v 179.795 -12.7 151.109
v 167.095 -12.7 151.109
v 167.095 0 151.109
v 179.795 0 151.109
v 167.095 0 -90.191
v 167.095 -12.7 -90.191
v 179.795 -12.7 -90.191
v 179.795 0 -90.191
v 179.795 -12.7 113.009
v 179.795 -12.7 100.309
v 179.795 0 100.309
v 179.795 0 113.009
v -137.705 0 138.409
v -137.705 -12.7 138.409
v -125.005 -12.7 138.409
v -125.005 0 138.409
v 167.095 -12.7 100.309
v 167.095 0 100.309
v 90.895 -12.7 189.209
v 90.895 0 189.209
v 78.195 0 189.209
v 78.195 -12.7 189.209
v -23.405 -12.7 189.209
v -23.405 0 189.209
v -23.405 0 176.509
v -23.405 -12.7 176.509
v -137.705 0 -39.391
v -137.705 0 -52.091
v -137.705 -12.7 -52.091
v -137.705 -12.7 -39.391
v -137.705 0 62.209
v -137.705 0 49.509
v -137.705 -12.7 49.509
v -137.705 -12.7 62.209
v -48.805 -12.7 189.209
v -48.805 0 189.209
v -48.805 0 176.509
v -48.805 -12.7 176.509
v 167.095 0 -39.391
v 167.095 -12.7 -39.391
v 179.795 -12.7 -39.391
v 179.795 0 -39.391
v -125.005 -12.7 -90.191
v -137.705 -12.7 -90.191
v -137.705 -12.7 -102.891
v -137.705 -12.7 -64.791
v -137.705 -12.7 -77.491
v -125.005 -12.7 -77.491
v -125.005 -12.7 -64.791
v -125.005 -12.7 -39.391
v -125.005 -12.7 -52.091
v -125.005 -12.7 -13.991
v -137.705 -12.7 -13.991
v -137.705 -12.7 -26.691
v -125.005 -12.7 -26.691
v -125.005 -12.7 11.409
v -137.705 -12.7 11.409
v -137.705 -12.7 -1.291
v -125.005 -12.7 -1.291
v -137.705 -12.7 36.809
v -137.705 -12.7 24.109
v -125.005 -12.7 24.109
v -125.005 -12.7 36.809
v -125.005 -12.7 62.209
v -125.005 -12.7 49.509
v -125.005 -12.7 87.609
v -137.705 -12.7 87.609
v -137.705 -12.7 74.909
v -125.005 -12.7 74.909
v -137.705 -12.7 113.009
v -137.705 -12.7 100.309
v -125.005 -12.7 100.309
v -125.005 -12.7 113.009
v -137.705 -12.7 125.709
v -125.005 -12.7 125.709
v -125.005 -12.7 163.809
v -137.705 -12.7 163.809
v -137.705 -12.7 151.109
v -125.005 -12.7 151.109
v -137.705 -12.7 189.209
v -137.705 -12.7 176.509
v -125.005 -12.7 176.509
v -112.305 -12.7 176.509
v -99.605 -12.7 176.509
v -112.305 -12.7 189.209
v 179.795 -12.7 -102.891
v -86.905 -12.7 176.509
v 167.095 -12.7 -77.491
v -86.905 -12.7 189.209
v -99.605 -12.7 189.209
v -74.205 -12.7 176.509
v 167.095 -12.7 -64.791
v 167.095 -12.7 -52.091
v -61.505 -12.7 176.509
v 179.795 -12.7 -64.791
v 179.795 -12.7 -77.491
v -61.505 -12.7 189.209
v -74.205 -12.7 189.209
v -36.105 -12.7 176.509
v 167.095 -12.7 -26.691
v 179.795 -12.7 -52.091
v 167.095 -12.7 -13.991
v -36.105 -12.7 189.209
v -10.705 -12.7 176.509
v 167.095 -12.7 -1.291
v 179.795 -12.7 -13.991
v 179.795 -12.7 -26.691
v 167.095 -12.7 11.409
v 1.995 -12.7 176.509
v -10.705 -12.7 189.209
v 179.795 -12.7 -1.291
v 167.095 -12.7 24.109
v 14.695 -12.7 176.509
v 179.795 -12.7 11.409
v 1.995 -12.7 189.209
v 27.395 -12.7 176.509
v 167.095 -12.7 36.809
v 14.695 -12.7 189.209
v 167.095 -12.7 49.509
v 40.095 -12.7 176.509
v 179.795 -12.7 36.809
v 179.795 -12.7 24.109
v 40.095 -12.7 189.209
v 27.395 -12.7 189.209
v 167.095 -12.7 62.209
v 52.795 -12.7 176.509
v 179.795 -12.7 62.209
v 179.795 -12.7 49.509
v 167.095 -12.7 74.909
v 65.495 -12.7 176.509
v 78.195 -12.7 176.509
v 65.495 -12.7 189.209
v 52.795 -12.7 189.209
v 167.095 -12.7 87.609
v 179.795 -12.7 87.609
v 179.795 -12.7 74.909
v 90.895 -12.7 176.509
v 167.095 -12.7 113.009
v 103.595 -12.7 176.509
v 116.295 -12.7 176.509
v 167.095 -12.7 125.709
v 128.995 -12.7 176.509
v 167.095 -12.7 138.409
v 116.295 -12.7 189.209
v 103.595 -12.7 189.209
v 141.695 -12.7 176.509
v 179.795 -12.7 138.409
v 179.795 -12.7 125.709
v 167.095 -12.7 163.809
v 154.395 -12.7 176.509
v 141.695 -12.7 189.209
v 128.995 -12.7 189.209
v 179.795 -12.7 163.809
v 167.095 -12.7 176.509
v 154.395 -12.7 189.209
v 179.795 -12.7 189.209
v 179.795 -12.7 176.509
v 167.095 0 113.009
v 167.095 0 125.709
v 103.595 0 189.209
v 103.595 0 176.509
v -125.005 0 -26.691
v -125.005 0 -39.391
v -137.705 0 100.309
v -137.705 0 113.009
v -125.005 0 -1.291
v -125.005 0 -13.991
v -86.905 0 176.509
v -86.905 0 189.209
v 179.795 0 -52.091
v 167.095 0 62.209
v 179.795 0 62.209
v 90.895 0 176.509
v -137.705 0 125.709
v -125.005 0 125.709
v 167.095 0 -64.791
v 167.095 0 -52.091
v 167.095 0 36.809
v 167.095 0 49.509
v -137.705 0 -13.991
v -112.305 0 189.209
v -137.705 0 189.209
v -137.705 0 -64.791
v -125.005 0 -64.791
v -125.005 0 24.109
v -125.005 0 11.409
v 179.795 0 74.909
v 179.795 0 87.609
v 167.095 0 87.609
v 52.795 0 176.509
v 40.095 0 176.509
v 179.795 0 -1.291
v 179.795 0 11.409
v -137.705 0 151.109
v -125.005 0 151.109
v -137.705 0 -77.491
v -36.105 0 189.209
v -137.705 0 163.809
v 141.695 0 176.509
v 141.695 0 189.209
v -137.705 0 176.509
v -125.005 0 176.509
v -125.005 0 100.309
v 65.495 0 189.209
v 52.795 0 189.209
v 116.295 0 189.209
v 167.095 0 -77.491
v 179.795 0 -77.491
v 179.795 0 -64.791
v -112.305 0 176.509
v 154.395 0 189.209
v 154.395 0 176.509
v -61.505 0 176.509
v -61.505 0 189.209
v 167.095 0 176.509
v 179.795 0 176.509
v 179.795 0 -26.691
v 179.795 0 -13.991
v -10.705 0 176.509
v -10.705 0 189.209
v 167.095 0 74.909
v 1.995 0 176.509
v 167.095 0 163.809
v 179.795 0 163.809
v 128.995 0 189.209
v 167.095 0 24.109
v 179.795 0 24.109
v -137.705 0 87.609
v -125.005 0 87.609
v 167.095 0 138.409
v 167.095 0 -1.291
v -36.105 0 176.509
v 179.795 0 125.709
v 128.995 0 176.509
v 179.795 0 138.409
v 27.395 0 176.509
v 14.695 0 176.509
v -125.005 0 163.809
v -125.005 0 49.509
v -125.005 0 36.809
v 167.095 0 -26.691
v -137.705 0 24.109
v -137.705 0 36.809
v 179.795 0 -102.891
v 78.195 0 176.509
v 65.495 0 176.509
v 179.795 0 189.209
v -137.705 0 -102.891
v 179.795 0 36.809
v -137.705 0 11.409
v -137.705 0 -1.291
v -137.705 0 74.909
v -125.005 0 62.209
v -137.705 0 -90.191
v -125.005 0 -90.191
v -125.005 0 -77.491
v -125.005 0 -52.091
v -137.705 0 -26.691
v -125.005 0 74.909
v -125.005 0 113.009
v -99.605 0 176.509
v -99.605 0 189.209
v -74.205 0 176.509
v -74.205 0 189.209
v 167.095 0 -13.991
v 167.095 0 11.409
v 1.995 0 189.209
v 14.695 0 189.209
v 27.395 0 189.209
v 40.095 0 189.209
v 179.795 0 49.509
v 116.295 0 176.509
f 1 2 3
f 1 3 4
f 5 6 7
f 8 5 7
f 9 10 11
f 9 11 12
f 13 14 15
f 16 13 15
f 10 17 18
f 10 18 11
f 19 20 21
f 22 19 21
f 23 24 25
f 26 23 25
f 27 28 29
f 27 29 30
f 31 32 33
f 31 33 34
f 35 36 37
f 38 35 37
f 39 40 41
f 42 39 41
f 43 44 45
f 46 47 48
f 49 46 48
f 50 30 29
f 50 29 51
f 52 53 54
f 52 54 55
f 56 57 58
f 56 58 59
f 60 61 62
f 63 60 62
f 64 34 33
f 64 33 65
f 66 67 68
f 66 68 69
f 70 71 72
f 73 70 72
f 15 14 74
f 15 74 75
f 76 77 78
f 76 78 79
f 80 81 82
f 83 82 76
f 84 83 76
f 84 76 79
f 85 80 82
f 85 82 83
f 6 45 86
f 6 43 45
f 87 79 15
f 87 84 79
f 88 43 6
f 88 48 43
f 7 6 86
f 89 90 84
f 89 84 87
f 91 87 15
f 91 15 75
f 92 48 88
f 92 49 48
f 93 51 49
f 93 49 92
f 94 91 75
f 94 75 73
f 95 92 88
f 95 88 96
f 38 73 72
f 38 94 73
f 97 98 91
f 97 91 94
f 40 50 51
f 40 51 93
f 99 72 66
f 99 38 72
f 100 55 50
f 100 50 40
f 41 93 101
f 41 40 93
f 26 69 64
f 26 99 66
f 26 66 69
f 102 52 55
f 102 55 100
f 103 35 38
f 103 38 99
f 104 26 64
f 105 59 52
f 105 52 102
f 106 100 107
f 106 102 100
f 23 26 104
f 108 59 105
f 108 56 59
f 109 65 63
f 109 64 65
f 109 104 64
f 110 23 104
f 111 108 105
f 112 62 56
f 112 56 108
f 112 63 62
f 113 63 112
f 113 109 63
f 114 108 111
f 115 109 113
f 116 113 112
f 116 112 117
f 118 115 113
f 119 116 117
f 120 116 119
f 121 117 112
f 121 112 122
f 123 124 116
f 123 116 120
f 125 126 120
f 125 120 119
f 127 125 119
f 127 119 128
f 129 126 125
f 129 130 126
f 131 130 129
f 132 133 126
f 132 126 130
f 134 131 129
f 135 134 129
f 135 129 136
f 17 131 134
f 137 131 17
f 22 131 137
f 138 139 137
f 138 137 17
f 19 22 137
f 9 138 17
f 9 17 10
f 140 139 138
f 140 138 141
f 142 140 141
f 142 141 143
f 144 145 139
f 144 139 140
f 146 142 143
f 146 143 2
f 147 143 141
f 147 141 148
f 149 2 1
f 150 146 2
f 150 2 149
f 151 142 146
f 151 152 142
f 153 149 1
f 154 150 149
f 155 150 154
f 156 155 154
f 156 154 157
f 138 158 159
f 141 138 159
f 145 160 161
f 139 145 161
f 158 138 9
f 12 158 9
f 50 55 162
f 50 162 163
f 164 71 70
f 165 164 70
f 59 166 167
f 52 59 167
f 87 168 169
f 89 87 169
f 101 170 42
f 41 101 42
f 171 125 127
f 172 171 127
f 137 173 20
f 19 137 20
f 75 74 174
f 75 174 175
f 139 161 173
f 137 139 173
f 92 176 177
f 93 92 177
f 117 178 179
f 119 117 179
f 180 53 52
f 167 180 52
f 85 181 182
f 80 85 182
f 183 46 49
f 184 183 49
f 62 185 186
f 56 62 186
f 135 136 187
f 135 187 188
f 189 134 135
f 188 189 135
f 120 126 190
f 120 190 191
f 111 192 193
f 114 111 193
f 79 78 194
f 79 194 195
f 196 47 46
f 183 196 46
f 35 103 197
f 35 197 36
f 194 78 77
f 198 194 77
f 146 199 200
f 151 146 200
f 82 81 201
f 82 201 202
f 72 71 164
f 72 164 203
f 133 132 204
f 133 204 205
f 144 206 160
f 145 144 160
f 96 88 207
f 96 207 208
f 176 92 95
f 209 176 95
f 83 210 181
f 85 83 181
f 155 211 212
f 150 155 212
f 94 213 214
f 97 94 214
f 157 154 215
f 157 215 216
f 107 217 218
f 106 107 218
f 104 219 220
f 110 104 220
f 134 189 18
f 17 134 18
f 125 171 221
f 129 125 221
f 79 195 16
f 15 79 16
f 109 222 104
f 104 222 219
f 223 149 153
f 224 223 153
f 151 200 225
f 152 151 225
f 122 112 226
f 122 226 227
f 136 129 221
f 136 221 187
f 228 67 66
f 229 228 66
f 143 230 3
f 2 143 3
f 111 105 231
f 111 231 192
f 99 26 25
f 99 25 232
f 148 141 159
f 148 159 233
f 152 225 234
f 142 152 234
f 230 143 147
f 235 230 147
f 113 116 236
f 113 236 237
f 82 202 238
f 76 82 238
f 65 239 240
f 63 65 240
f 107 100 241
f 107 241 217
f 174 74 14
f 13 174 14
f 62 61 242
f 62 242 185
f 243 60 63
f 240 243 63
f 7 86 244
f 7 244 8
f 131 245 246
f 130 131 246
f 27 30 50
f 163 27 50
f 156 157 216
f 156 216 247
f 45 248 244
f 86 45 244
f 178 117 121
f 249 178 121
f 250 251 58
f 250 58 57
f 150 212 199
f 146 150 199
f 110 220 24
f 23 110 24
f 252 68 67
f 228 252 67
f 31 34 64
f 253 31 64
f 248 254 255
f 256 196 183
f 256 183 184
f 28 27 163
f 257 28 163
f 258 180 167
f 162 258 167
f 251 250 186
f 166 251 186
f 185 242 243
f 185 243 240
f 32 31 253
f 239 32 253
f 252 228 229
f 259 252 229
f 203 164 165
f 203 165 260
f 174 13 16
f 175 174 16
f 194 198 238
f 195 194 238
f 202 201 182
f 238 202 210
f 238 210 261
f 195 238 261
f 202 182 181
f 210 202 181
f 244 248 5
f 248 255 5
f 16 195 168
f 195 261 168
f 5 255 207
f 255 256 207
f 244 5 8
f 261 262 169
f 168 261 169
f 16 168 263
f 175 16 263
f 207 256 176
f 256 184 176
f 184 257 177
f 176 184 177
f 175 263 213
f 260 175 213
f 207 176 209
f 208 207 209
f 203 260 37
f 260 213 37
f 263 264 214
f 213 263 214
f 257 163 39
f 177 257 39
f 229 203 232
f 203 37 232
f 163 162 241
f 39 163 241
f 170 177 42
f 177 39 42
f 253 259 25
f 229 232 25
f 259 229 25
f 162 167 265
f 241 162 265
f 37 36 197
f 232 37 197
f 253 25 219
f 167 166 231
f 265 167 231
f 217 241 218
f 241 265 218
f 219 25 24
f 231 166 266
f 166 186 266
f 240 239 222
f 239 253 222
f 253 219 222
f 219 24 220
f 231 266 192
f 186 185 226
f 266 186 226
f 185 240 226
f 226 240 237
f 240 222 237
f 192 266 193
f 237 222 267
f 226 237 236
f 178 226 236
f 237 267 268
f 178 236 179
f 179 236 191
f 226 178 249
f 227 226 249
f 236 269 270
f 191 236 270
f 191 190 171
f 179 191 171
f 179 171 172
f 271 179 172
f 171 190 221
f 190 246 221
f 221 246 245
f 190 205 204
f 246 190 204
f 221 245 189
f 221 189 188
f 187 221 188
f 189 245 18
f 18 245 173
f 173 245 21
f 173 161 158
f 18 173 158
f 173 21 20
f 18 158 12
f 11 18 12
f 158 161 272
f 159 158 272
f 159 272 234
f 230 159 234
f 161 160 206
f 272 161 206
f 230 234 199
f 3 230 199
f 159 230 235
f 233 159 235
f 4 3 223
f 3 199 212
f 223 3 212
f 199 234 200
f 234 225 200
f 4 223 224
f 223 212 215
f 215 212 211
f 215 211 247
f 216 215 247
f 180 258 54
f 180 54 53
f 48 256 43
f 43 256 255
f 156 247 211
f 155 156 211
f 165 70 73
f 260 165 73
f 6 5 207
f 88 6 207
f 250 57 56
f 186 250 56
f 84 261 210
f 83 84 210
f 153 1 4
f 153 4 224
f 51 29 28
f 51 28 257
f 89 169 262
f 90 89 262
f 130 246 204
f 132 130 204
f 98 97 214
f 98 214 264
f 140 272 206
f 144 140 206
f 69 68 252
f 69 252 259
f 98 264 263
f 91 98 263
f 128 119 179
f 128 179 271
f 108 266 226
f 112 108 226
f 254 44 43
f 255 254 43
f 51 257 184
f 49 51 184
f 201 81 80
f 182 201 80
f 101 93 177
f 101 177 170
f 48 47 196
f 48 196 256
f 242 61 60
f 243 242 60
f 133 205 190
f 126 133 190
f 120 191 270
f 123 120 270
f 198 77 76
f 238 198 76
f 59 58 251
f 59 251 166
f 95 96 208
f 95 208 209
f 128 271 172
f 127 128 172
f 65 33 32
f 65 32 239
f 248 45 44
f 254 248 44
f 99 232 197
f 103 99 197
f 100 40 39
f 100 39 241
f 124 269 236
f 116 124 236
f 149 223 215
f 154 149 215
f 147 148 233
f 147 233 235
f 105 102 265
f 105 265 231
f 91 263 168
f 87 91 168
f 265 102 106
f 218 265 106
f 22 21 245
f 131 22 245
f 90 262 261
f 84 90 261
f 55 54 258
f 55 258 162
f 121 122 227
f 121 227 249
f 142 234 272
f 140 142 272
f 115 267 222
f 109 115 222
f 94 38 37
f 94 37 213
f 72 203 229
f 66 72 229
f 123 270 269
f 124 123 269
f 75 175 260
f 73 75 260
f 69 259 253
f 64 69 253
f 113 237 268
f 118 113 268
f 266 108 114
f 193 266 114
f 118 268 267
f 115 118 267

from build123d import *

# Parameters (mm, degrees)
F0_W     = 12.7
F0_H     = 12.7
F1_DEPTH = 12.7


with BuildPart() as f1:
    # F0 (on Front) → F1 (new body)
    with BuildSketch(Plane.XZ):
        with Locations((-131.354641, 182.858769)):
            Rectangle(F0_W, F0_H)
        with Locations((-131.354641, 157.458769)):
            Rectangle(F0_W, F0_H)
        Polygon((-112.304641, 189.208769), (-125.004641, 189.208769), (-125.004641, 176.508769), (-125.004641, 163.808769), (-125.004641, 151.108769), (-125.004641, 138.408769), (-125.004641, 125.708769), (-125.004641, 113.008769), (-125.004641, 100.308769), (-125.004641, 87.608769), (-125.004641, 74.908769), (-125.004641, 62.208769), (-125.004641, 49.508769), (-125.004641, 36.808769), (-125.004641, 24.108769), (-125.004641, 11.408769), (-125.004641, -1.291231), (-125.004641, -13.991231), (-125.004641, -26.691231), (-125.004641, -39.391231), (-125.004641, -52.091231), (-125.004641, -64.791231), (-125.004641, -77.491231), (-125.004641, -90.191231), (-125.004641, -102.891231), (167.095359, -102.891231), (167.095359, -90.191231), (167.095359, -77.491231), (167.095359, -64.791231), (167.095359, -52.091231), (167.095359, -39.391231), (167.095359, -26.691231), (167.095359, -13.991231), (167.095359, -1.291231), (167.095359, 11.408769), (167.095359, 24.108769), (167.095359, 36.808769), (167.095359, 49.508769), (167.095359, 62.208769), (167.095359, 74.908769), (167.095359, 87.608769), (167.095359, 100.308769), (167.095359, 113.008769), (167.095359, 125.708769), (167.095359, 138.408769), (167.095359, 151.108769), (167.095359, 163.808769), (167.095359, 176.508769), (167.095359, 189.208769), (154.395359, 189.208769), (154.395359, 176.508769), (141.695359, 176.508769), (141.695359, 189.208769), (128.995359, 189.208769), (128.995359, 176.508769), (116.295359, 176.508769), (116.295359, 189.208769), (103.595359, 189.208769), (103.595359, 176.508769), (90.895359, 176.508769), (90.895359, 189.208769), (78.195359, 189.208769), (78.195359, 176.508769), (65.495359, 176.508769), (65.495359, 189.208769), (52.795359, 189.208769), (52.795359, 176.508769), (40.095359, 176.508769), (40.095359, 189.208769), (27.395359, 189.208769), (27.395359, 176.508769), (14.695359, 176.508769), (14.695359, 189.208769), (1.995359, 189.208769), (1.995359, 176.508769), (-10.704641, 176.508769), (-10.704641, 189.208769), (-23.404641, 189.208769), (-23.404641, 176.508769), (-36.104641, 176.508769), (-36.104641, 189.208769), (-48.804641, 189.208769), (-48.804641, 176.508769), (-61.504641, 176.508769), (-61.504641, 189.208769), (-74.204641, 189.208769), (-74.204641, 176.508769), (-86.904641, 176.508769), (-86.904641, 189.208769), (-99.604641, 189.208769), (-99.604641, 176.508769), (-112.304641, 176.508769), align=None)
        with Locations((173.445359, 182.858769)):
            Rectangle(F0_W, F0_H)
        with Locations((173.445359, 157.458769)):
            Rectangle(F0_W, F0_H)
        with Locations((173.445359, 132.058769)):
            Rectangle(F0_W, F0_H)
        with Locations((173.445359, 106.658769)):
            Rectangle(F0_W, F0_H)
        with Locations((173.445359, 81.258769)):
            Rectangle(F0_W, F0_H)
        with Locations((173.445359, 55.858769)):
            Rectangle(F0_W, F0_H)
        with Locations((173.445359, 30.458769)):
            Rectangle(F0_W, F0_H)
        with Locations((173.445359, 5.058769)):
            Rectangle(F0_W, F0_H)
        with Locations((173.445359, -20.341231)):
            Rectangle(F0_W, F0_H)
        with Locations((173.445359, -45.741231)):
            Rectangle(F0_W, F0_H)
        with Locations((173.445359, -71.141231)):
            Rectangle(F0_W, F0_H)
        with Locations((173.445359, -96.541231)):
            Rectangle(F0_W, F0_H)
        with Locations((-131.354641, -96.541231)):
            Rectangle(F0_W, F0_H)
        with Locations((-131.354641, -71.141231)):
            Rectangle(F0_W, F0_H)
        with Locations((-131.354641, -45.741231)):
            Rectangle(F0_W, F0_H)
        with Locations((-131.354641, -20.341231)):
            Rectangle(F0_W, F0_H)
        with Locations((-131.354641, 5.058769)):
            Rectangle(F0_W, F0_H)
        with Locations((-131.354641, 30.458769)):
            Rectangle(F0_W, F0_H)
        with Locations((-131.354641, 55.858769)):
            Rectangle(F0_W, F0_H)
        with Locations((-131.354641, 81.258769)):
            Rectangle(F0_W, F0_H)
        with Locations((-131.354641, 106.658769)):
            Rectangle(F0_W, F0_H)
        with Locations((-131.354641, 132.058769)):
            Rectangle(F0_W, F0_H)
    extrude(amount=F1_DEPTH)


with BuildPart() as f2_1:
    # F2: copy of F1
    add(f1.part)


solid = f2_1.part
